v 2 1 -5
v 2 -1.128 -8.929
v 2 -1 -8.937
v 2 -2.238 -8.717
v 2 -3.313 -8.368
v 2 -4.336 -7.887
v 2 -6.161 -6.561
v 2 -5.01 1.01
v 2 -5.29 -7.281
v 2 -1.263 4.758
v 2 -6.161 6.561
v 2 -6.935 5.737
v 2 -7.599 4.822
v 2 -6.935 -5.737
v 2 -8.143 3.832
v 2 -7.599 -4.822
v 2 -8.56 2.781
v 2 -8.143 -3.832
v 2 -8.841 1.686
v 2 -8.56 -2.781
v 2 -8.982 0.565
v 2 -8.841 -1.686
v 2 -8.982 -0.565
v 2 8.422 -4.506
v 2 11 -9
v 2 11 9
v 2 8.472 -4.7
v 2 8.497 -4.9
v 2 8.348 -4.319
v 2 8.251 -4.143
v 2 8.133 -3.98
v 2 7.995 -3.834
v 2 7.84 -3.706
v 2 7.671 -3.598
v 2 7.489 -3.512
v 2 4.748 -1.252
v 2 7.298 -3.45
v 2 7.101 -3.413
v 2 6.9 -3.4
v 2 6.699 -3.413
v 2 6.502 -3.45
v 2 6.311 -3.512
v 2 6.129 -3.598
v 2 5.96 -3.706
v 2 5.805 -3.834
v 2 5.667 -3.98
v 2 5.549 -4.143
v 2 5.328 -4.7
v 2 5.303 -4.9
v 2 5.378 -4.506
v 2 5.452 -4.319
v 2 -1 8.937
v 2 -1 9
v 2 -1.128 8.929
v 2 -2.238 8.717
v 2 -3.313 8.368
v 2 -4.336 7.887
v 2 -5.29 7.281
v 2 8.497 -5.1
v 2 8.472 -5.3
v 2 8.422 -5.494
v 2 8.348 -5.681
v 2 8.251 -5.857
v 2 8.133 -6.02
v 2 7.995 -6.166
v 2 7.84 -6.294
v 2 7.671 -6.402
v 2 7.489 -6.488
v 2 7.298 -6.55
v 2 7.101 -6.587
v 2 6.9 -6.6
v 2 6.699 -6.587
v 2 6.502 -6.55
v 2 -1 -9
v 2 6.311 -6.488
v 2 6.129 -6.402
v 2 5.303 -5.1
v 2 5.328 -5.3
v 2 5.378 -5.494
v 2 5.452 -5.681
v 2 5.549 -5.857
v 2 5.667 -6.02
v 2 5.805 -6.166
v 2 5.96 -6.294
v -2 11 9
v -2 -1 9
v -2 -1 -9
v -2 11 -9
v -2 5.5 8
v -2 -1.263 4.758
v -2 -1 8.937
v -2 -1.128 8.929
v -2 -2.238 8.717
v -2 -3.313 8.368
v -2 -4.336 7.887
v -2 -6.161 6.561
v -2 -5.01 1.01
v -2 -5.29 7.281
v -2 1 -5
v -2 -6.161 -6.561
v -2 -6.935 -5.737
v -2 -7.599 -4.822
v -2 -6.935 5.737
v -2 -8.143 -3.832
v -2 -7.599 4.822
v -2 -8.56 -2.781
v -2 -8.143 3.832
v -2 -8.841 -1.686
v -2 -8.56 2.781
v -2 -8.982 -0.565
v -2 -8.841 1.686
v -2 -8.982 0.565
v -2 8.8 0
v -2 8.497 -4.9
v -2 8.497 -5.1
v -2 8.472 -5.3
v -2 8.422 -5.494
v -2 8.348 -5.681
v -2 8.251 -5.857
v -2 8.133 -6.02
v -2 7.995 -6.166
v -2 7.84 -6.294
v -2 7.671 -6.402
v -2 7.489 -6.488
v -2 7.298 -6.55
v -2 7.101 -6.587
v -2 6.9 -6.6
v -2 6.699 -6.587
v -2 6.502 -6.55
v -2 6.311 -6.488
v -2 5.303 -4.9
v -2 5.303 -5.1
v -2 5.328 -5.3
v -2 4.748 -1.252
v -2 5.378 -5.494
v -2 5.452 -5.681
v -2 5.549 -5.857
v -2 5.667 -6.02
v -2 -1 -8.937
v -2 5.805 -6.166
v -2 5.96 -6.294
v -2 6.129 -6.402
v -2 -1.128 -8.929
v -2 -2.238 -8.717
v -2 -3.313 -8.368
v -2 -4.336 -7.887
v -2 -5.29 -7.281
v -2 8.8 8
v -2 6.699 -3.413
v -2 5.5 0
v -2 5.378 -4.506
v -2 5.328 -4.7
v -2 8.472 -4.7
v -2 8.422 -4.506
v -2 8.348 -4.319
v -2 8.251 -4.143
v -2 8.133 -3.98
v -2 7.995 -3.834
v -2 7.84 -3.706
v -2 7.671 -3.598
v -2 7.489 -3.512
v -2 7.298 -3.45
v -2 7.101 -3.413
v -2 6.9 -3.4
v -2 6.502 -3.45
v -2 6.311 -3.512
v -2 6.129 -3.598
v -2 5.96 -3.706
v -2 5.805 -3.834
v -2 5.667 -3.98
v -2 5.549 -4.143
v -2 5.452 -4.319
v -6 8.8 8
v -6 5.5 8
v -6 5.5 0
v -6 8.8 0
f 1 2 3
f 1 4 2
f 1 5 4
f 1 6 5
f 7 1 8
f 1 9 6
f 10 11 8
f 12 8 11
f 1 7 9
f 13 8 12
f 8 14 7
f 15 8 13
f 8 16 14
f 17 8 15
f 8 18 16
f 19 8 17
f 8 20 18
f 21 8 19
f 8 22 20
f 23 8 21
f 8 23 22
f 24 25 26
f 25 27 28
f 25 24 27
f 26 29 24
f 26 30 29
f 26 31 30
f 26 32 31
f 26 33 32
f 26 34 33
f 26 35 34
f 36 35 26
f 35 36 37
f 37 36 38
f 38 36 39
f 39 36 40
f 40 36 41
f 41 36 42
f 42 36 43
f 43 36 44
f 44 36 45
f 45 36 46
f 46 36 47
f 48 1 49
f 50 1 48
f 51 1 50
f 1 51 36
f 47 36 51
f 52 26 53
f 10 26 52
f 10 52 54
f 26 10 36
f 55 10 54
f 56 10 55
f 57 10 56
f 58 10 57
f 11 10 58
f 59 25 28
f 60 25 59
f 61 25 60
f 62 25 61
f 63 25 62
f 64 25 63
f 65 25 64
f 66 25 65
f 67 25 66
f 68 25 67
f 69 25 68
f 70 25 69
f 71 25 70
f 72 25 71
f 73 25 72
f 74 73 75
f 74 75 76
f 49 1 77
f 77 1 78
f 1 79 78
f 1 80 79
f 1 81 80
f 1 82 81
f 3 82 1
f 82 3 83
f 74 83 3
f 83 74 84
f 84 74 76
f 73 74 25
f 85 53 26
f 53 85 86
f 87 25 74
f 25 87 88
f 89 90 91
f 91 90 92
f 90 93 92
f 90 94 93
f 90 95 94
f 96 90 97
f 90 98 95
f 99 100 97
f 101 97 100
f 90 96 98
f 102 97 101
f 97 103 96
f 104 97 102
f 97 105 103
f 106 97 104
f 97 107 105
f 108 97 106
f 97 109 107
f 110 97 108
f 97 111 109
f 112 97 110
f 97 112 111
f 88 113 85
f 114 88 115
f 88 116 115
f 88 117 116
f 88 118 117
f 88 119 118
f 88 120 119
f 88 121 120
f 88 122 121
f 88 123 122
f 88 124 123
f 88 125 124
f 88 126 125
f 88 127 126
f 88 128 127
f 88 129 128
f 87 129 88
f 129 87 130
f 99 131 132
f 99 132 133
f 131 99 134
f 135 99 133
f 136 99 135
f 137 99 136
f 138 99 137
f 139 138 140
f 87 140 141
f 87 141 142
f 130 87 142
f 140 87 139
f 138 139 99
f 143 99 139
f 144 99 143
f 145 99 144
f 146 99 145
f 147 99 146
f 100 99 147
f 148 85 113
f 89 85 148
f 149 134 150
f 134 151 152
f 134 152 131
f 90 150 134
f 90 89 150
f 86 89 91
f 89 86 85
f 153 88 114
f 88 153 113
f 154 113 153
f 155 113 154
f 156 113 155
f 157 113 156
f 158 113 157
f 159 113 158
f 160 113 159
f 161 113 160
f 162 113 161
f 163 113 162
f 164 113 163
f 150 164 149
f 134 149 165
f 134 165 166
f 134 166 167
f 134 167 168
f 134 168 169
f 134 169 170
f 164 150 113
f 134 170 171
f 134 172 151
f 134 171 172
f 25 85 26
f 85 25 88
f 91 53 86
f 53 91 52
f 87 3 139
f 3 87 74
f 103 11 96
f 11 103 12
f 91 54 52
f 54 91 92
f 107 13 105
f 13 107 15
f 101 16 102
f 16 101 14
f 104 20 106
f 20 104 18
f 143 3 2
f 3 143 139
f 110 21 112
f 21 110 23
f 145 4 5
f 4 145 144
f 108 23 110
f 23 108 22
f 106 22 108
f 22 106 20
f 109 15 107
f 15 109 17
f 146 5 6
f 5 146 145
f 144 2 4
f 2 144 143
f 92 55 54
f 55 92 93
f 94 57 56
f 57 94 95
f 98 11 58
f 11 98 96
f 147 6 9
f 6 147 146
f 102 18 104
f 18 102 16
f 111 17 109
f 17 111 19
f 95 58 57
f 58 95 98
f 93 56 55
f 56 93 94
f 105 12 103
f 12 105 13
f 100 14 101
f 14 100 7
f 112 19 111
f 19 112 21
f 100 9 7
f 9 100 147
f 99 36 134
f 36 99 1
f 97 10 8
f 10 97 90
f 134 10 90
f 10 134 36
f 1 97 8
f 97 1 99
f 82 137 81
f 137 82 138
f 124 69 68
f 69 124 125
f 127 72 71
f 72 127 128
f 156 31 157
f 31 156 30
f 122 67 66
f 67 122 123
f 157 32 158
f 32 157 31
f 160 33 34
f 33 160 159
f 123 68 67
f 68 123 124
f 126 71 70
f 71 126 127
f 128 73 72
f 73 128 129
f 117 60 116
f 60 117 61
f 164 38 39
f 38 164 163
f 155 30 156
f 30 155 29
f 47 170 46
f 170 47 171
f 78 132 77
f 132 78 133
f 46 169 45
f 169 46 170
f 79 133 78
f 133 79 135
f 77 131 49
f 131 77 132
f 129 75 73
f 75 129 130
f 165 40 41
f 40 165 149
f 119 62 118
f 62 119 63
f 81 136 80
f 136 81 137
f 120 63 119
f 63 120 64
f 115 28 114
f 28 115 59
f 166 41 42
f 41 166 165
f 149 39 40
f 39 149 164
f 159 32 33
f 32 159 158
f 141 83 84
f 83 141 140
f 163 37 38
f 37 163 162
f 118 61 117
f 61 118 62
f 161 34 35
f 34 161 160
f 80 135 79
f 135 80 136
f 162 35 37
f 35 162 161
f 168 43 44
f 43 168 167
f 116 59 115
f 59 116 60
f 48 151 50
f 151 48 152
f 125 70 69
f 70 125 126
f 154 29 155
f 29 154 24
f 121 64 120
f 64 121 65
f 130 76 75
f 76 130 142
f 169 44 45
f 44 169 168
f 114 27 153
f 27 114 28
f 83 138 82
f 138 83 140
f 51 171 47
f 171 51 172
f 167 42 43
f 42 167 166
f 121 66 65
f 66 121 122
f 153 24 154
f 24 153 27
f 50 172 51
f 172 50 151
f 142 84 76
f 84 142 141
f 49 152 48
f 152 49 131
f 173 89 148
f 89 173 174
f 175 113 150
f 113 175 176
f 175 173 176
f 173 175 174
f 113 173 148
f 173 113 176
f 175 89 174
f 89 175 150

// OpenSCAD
// file: config.scad
$fn = 50;
screw_distance_x = 60;
screw_distance_y = 40;
wall_thickness = 2.5;

case_width = screw_distance_x*2;
case_length = screw_distance_y*2.25+15;
case_height = 32;

bearing_diameter = 16;
bearing_length = 28;
// main file
include <config.scad>;

mirror_mount();

module mirror_mount_sensor(){


   difference(){ 
    union(){
      translate([0,-1,0]) cube([5,23,18],true);
       // translate([-1,-8,0]) cube([3,14,16],true);
       //rotate([0,90,0]) cylinder(5,8,8,true);

    }
    	color([0,0,255]) translate([-7,1,-5]) rotate([45,0,0]) cube([case_width,5.3,8.5]);
    translate([0,6.9,-5]) rotate([0,90,0]) cylinder(9,1.6,1.6,true);
    translate([0,-8,-3]){
       //translate([-5,0,-6.1]) rotate([0,90,0]) cylinder(10,1.6,1.6);
       translate([-5,0,6.1]) rotate([0,90,0]) cylinder(10,1.6,1.6);
    }
    translate([-3,-12.5,-6]) cube([6.8,6.5,6.5]);
     translate([-2.6,-12.5,-9]) cube([2,7.5,18.5]);
  }
    translate([-8,5.5,0]) cube([10,3.3,8]);

}

module mirror_mount(){


   difference(){ 
    union(){
      translate([0,5,0]) cube([4,12,18],true);
       rotate([0,90,0]) cylinder(4,9,9,true);
    }
    	color([0,0,255]) translate([-7,1,-5]) rotate([45,0,0]) cube([case_width,5.3,8.5]);
    translate([0,6.9,-5]) rotate([0,90,0]) cylinder(9,1.6,1.6,true);
  }
    translate([-6,5.5,0]) cube([5,3.3,8]);


}
